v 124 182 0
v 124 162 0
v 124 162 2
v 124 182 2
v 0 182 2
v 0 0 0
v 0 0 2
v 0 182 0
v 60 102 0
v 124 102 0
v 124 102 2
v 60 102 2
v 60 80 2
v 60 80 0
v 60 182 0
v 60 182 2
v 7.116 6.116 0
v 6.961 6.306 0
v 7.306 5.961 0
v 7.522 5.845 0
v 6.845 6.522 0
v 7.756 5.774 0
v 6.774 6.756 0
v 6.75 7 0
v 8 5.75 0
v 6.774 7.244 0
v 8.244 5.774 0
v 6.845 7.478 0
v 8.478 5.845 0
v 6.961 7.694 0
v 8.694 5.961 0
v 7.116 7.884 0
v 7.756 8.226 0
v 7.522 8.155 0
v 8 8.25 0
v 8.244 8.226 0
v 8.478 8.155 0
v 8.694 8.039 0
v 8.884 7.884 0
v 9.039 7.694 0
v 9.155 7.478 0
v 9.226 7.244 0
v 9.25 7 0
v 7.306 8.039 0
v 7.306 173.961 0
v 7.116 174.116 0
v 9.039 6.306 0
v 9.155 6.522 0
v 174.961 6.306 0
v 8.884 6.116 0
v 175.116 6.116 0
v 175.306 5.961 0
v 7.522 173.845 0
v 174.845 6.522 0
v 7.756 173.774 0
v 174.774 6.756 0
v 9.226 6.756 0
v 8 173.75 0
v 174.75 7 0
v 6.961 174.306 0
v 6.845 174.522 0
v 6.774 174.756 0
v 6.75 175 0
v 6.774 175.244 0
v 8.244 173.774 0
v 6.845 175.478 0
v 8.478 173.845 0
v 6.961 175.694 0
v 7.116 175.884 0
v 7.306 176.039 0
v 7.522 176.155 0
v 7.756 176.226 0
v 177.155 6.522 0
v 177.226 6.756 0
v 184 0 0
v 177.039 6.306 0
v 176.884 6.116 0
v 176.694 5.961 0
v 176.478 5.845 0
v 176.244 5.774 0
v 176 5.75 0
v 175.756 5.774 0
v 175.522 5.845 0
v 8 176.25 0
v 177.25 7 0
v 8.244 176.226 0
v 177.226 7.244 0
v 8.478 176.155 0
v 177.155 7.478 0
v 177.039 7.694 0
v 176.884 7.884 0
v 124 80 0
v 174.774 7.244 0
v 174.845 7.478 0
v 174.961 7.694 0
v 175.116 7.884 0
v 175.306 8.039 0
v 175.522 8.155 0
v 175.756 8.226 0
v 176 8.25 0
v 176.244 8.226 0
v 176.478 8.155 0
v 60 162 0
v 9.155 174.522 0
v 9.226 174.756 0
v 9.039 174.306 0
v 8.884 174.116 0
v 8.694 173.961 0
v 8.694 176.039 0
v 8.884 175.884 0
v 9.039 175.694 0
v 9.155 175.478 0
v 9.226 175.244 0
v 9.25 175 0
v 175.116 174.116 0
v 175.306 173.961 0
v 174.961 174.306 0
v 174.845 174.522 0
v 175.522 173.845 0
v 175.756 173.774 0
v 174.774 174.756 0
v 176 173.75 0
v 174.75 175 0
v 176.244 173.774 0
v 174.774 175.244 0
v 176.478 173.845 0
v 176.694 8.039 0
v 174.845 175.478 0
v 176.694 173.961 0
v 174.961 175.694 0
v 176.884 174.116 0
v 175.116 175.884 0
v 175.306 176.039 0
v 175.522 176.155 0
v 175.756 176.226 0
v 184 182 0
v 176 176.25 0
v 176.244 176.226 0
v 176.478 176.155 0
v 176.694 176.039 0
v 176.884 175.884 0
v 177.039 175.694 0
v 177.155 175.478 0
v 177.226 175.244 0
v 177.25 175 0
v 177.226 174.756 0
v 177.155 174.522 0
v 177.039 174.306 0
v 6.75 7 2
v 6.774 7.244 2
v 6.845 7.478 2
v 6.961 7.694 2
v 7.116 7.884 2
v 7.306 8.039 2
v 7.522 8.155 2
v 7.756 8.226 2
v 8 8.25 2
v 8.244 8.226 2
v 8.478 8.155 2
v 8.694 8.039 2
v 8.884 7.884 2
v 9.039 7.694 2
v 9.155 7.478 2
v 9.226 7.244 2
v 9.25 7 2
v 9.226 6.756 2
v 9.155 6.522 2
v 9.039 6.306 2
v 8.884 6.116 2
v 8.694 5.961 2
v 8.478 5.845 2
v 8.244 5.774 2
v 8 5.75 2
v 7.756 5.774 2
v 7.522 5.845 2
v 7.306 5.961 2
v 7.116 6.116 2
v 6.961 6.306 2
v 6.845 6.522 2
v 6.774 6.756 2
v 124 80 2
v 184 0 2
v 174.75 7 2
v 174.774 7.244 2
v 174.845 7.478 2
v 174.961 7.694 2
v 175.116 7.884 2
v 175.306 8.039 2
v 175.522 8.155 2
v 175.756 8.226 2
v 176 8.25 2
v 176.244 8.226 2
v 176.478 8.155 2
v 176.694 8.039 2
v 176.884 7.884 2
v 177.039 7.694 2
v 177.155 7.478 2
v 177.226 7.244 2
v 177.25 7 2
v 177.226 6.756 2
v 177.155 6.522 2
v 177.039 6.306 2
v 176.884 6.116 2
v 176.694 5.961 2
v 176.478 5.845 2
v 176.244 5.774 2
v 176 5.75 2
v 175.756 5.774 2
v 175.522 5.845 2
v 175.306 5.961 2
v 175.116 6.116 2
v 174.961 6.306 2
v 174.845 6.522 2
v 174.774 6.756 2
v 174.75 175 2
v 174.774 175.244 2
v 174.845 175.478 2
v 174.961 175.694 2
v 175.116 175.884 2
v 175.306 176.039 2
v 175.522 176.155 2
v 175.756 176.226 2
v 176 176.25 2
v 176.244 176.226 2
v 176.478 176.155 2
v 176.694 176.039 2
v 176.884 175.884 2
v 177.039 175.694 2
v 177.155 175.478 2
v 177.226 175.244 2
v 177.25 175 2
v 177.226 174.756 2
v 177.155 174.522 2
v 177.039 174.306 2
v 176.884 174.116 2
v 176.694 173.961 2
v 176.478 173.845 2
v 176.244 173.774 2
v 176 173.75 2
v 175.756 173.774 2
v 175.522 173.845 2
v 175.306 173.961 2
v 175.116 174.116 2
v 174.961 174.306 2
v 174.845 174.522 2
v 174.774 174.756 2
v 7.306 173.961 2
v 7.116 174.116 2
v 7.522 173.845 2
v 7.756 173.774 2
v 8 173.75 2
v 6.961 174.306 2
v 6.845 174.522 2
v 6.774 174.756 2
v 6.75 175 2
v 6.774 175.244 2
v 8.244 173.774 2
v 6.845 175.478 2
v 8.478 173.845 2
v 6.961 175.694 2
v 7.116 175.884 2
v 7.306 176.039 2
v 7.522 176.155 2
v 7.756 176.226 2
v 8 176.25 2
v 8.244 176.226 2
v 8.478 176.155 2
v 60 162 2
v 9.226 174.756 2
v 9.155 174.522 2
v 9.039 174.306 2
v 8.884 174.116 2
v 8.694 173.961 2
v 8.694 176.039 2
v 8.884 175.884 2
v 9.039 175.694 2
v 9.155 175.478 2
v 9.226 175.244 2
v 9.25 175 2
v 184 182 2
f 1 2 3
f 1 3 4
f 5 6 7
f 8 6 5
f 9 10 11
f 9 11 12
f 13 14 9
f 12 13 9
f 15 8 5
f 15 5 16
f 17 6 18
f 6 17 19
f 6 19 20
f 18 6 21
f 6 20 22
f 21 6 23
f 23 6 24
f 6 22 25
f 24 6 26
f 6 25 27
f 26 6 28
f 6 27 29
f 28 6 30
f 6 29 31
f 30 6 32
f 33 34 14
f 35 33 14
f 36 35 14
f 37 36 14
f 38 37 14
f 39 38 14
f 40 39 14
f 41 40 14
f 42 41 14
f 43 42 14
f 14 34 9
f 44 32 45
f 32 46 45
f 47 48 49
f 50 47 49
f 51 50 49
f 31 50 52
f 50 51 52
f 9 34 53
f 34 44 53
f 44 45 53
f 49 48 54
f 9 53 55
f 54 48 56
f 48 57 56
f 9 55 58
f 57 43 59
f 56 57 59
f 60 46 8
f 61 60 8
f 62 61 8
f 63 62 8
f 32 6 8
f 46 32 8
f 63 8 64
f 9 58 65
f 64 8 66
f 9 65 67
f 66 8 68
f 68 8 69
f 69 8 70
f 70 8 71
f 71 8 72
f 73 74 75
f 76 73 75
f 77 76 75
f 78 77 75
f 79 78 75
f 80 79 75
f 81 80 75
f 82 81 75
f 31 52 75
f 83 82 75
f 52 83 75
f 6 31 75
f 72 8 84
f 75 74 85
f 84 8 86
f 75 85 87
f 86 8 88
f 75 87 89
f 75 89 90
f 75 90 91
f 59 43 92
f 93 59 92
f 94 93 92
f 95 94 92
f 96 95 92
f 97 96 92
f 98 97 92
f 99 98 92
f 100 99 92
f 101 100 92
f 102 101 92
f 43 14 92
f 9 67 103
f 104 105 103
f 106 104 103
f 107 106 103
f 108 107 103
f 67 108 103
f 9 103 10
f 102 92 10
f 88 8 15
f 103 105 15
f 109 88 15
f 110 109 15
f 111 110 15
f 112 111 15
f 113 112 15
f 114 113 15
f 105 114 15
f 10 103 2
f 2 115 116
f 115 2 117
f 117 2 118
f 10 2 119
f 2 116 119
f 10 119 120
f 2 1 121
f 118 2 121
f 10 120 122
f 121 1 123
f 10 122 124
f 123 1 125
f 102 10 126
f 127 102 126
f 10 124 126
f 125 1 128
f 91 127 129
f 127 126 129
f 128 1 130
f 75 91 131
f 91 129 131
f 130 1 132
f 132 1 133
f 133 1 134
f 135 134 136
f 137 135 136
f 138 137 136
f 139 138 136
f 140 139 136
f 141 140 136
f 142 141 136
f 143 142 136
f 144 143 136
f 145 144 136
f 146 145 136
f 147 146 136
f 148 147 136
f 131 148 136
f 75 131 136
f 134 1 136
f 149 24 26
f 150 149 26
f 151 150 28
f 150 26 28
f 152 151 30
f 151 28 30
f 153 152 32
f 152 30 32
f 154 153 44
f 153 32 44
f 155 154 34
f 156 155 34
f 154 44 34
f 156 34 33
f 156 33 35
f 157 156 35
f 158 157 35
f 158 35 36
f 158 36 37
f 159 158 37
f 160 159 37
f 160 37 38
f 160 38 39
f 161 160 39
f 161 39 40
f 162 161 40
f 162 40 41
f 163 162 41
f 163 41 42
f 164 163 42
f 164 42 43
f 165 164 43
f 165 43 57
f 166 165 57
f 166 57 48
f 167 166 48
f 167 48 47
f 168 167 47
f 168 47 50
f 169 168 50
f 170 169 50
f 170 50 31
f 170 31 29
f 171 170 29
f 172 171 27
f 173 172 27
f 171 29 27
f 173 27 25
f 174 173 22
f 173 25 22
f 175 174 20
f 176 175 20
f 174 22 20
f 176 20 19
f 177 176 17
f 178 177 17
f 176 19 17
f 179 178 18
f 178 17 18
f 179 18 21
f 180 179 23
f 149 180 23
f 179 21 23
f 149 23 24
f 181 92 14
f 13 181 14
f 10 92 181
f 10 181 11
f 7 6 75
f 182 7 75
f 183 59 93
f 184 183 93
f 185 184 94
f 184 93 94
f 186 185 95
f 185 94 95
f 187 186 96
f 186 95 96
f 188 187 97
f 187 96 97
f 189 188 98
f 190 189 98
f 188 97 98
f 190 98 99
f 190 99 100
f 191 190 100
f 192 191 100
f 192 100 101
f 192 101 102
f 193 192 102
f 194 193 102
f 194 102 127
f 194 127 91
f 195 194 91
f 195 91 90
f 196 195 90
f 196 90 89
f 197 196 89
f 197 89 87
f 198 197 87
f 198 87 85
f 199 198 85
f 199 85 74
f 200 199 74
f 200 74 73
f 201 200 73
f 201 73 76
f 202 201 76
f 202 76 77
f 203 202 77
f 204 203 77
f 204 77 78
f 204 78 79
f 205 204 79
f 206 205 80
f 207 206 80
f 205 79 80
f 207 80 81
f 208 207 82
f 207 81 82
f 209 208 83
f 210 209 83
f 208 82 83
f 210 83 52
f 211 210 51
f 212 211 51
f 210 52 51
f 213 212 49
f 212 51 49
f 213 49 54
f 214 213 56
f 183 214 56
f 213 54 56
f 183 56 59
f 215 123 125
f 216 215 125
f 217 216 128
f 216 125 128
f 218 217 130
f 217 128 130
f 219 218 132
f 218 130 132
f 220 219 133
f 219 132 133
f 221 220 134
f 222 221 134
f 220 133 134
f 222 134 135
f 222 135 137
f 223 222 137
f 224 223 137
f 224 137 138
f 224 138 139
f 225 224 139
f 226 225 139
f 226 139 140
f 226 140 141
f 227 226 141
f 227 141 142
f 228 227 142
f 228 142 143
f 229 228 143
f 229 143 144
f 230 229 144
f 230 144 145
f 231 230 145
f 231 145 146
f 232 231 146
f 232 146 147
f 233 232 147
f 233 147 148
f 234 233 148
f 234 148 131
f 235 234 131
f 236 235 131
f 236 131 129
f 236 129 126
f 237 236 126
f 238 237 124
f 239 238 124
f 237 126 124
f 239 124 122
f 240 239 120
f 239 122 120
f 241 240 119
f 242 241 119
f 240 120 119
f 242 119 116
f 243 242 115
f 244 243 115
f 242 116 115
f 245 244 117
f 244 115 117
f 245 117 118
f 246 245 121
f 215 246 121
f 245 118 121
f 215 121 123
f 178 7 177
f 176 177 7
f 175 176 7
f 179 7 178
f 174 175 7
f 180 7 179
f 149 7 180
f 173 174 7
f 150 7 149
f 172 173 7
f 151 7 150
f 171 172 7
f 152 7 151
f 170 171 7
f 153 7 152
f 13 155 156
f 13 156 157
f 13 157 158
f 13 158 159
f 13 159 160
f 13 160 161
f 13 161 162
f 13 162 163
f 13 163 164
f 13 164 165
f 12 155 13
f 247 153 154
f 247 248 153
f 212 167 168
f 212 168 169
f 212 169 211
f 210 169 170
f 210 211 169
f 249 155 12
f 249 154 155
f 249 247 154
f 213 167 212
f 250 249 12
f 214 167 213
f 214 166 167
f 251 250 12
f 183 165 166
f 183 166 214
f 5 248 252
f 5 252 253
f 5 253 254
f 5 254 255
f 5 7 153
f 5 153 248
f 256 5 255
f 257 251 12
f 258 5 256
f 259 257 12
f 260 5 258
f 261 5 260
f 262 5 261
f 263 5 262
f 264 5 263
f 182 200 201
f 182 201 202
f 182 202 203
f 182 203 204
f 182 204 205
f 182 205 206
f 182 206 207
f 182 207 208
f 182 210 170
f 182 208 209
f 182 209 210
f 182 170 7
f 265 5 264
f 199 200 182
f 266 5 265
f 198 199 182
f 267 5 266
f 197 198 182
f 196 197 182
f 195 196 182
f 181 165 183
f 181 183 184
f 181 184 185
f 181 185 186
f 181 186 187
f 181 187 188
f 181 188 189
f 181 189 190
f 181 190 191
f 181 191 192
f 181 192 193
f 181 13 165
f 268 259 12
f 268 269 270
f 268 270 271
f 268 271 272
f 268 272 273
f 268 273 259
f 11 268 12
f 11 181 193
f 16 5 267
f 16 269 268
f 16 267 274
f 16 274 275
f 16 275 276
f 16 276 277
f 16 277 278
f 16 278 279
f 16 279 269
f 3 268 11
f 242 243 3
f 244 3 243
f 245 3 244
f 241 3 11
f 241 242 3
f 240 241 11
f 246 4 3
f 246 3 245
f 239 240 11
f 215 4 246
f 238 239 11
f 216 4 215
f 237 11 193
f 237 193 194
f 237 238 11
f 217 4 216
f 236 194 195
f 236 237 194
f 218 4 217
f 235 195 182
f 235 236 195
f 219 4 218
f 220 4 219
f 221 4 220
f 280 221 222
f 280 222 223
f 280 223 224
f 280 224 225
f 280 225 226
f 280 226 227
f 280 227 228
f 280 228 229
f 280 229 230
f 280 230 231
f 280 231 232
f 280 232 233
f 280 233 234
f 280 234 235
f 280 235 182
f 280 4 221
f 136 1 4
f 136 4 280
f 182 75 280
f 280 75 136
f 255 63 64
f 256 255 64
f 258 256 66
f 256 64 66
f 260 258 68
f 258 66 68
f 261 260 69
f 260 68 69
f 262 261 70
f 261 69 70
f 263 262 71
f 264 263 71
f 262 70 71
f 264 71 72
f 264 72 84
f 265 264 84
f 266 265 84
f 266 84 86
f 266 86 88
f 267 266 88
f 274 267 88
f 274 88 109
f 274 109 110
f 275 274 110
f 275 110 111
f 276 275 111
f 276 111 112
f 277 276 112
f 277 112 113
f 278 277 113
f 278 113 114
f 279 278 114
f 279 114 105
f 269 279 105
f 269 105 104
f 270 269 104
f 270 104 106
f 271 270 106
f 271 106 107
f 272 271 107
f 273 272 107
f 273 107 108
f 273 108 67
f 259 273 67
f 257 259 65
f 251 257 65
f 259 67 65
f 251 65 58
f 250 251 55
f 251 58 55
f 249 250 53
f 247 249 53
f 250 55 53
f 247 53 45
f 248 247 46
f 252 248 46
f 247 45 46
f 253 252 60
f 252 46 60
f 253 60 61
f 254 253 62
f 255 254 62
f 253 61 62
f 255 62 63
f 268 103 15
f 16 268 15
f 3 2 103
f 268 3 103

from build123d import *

# Parameters (mm, degrees)
SKETCH_1_W          = 184
SKETCH_1_H          = 182
EXTRUDE_1_DEPTH     = 2
M3X0_5_1_D          = 2.5
SKETCH_4_W          = 64
SKETCH_4_H          = 20
CUT_EXTRUDE_1_DEPTH = 259.812673569
SKETCH_6_W          = 64
SKETCH_6_H          = 22
CUT_EXTRUDE_2_DEPTH = 10


with BuildPart() as part:
    # ｽｹｯﾁ1 → ﾎﾞｽ - 押し出し1 (new body)
    with BuildSketch(Plane.XY):
        with Locations((92, 91)):
            Rectangle(SKETCH_1_W, SKETCH_1_H)
    extrude(amount=EXTRUDE_1_DEPTH)

    # M3x0.5 ねじ穴1 (through all)
    with Locations(Plane.XY.offset(2)):
        with Locations((8, 175), (8, 7), (176, 7), (176, 175)):
            Hole(M3X0_5_1_D / 2)

    # ｽｹｯﾁ4 → ｶｯﾄ - 押し出し1 (cut, through all)
    with BuildSketch(Plane(origin=(0, 0, 0), x_dir=(-1, 0, 0), z_dir=(0, 0, -1))):
        with Locations((-92, 172)):
            Rectangle(SKETCH_4_W, SKETCH_4_H)
    extrude(amount=-CUT_EXTRUDE_1_DEPTH, mode=Mode.SUBTRACT)

    # ｽｹｯﾁ6 → ｶｯﾄ - 押し出し2 (cut)
    with BuildSketch(Plane(origin=(0, 0, 0), x_dir=(-1, 0, 0), z_dir=(0, 0, -1))):
        with Locations((-92, 91)):
            Rectangle(SKETCH_6_W, SKETCH_6_H)
    extrude(amount=-CUT_EXTRUDE_2_DEPTH, mode=Mode.SUBTRACT)


solid = part.part
